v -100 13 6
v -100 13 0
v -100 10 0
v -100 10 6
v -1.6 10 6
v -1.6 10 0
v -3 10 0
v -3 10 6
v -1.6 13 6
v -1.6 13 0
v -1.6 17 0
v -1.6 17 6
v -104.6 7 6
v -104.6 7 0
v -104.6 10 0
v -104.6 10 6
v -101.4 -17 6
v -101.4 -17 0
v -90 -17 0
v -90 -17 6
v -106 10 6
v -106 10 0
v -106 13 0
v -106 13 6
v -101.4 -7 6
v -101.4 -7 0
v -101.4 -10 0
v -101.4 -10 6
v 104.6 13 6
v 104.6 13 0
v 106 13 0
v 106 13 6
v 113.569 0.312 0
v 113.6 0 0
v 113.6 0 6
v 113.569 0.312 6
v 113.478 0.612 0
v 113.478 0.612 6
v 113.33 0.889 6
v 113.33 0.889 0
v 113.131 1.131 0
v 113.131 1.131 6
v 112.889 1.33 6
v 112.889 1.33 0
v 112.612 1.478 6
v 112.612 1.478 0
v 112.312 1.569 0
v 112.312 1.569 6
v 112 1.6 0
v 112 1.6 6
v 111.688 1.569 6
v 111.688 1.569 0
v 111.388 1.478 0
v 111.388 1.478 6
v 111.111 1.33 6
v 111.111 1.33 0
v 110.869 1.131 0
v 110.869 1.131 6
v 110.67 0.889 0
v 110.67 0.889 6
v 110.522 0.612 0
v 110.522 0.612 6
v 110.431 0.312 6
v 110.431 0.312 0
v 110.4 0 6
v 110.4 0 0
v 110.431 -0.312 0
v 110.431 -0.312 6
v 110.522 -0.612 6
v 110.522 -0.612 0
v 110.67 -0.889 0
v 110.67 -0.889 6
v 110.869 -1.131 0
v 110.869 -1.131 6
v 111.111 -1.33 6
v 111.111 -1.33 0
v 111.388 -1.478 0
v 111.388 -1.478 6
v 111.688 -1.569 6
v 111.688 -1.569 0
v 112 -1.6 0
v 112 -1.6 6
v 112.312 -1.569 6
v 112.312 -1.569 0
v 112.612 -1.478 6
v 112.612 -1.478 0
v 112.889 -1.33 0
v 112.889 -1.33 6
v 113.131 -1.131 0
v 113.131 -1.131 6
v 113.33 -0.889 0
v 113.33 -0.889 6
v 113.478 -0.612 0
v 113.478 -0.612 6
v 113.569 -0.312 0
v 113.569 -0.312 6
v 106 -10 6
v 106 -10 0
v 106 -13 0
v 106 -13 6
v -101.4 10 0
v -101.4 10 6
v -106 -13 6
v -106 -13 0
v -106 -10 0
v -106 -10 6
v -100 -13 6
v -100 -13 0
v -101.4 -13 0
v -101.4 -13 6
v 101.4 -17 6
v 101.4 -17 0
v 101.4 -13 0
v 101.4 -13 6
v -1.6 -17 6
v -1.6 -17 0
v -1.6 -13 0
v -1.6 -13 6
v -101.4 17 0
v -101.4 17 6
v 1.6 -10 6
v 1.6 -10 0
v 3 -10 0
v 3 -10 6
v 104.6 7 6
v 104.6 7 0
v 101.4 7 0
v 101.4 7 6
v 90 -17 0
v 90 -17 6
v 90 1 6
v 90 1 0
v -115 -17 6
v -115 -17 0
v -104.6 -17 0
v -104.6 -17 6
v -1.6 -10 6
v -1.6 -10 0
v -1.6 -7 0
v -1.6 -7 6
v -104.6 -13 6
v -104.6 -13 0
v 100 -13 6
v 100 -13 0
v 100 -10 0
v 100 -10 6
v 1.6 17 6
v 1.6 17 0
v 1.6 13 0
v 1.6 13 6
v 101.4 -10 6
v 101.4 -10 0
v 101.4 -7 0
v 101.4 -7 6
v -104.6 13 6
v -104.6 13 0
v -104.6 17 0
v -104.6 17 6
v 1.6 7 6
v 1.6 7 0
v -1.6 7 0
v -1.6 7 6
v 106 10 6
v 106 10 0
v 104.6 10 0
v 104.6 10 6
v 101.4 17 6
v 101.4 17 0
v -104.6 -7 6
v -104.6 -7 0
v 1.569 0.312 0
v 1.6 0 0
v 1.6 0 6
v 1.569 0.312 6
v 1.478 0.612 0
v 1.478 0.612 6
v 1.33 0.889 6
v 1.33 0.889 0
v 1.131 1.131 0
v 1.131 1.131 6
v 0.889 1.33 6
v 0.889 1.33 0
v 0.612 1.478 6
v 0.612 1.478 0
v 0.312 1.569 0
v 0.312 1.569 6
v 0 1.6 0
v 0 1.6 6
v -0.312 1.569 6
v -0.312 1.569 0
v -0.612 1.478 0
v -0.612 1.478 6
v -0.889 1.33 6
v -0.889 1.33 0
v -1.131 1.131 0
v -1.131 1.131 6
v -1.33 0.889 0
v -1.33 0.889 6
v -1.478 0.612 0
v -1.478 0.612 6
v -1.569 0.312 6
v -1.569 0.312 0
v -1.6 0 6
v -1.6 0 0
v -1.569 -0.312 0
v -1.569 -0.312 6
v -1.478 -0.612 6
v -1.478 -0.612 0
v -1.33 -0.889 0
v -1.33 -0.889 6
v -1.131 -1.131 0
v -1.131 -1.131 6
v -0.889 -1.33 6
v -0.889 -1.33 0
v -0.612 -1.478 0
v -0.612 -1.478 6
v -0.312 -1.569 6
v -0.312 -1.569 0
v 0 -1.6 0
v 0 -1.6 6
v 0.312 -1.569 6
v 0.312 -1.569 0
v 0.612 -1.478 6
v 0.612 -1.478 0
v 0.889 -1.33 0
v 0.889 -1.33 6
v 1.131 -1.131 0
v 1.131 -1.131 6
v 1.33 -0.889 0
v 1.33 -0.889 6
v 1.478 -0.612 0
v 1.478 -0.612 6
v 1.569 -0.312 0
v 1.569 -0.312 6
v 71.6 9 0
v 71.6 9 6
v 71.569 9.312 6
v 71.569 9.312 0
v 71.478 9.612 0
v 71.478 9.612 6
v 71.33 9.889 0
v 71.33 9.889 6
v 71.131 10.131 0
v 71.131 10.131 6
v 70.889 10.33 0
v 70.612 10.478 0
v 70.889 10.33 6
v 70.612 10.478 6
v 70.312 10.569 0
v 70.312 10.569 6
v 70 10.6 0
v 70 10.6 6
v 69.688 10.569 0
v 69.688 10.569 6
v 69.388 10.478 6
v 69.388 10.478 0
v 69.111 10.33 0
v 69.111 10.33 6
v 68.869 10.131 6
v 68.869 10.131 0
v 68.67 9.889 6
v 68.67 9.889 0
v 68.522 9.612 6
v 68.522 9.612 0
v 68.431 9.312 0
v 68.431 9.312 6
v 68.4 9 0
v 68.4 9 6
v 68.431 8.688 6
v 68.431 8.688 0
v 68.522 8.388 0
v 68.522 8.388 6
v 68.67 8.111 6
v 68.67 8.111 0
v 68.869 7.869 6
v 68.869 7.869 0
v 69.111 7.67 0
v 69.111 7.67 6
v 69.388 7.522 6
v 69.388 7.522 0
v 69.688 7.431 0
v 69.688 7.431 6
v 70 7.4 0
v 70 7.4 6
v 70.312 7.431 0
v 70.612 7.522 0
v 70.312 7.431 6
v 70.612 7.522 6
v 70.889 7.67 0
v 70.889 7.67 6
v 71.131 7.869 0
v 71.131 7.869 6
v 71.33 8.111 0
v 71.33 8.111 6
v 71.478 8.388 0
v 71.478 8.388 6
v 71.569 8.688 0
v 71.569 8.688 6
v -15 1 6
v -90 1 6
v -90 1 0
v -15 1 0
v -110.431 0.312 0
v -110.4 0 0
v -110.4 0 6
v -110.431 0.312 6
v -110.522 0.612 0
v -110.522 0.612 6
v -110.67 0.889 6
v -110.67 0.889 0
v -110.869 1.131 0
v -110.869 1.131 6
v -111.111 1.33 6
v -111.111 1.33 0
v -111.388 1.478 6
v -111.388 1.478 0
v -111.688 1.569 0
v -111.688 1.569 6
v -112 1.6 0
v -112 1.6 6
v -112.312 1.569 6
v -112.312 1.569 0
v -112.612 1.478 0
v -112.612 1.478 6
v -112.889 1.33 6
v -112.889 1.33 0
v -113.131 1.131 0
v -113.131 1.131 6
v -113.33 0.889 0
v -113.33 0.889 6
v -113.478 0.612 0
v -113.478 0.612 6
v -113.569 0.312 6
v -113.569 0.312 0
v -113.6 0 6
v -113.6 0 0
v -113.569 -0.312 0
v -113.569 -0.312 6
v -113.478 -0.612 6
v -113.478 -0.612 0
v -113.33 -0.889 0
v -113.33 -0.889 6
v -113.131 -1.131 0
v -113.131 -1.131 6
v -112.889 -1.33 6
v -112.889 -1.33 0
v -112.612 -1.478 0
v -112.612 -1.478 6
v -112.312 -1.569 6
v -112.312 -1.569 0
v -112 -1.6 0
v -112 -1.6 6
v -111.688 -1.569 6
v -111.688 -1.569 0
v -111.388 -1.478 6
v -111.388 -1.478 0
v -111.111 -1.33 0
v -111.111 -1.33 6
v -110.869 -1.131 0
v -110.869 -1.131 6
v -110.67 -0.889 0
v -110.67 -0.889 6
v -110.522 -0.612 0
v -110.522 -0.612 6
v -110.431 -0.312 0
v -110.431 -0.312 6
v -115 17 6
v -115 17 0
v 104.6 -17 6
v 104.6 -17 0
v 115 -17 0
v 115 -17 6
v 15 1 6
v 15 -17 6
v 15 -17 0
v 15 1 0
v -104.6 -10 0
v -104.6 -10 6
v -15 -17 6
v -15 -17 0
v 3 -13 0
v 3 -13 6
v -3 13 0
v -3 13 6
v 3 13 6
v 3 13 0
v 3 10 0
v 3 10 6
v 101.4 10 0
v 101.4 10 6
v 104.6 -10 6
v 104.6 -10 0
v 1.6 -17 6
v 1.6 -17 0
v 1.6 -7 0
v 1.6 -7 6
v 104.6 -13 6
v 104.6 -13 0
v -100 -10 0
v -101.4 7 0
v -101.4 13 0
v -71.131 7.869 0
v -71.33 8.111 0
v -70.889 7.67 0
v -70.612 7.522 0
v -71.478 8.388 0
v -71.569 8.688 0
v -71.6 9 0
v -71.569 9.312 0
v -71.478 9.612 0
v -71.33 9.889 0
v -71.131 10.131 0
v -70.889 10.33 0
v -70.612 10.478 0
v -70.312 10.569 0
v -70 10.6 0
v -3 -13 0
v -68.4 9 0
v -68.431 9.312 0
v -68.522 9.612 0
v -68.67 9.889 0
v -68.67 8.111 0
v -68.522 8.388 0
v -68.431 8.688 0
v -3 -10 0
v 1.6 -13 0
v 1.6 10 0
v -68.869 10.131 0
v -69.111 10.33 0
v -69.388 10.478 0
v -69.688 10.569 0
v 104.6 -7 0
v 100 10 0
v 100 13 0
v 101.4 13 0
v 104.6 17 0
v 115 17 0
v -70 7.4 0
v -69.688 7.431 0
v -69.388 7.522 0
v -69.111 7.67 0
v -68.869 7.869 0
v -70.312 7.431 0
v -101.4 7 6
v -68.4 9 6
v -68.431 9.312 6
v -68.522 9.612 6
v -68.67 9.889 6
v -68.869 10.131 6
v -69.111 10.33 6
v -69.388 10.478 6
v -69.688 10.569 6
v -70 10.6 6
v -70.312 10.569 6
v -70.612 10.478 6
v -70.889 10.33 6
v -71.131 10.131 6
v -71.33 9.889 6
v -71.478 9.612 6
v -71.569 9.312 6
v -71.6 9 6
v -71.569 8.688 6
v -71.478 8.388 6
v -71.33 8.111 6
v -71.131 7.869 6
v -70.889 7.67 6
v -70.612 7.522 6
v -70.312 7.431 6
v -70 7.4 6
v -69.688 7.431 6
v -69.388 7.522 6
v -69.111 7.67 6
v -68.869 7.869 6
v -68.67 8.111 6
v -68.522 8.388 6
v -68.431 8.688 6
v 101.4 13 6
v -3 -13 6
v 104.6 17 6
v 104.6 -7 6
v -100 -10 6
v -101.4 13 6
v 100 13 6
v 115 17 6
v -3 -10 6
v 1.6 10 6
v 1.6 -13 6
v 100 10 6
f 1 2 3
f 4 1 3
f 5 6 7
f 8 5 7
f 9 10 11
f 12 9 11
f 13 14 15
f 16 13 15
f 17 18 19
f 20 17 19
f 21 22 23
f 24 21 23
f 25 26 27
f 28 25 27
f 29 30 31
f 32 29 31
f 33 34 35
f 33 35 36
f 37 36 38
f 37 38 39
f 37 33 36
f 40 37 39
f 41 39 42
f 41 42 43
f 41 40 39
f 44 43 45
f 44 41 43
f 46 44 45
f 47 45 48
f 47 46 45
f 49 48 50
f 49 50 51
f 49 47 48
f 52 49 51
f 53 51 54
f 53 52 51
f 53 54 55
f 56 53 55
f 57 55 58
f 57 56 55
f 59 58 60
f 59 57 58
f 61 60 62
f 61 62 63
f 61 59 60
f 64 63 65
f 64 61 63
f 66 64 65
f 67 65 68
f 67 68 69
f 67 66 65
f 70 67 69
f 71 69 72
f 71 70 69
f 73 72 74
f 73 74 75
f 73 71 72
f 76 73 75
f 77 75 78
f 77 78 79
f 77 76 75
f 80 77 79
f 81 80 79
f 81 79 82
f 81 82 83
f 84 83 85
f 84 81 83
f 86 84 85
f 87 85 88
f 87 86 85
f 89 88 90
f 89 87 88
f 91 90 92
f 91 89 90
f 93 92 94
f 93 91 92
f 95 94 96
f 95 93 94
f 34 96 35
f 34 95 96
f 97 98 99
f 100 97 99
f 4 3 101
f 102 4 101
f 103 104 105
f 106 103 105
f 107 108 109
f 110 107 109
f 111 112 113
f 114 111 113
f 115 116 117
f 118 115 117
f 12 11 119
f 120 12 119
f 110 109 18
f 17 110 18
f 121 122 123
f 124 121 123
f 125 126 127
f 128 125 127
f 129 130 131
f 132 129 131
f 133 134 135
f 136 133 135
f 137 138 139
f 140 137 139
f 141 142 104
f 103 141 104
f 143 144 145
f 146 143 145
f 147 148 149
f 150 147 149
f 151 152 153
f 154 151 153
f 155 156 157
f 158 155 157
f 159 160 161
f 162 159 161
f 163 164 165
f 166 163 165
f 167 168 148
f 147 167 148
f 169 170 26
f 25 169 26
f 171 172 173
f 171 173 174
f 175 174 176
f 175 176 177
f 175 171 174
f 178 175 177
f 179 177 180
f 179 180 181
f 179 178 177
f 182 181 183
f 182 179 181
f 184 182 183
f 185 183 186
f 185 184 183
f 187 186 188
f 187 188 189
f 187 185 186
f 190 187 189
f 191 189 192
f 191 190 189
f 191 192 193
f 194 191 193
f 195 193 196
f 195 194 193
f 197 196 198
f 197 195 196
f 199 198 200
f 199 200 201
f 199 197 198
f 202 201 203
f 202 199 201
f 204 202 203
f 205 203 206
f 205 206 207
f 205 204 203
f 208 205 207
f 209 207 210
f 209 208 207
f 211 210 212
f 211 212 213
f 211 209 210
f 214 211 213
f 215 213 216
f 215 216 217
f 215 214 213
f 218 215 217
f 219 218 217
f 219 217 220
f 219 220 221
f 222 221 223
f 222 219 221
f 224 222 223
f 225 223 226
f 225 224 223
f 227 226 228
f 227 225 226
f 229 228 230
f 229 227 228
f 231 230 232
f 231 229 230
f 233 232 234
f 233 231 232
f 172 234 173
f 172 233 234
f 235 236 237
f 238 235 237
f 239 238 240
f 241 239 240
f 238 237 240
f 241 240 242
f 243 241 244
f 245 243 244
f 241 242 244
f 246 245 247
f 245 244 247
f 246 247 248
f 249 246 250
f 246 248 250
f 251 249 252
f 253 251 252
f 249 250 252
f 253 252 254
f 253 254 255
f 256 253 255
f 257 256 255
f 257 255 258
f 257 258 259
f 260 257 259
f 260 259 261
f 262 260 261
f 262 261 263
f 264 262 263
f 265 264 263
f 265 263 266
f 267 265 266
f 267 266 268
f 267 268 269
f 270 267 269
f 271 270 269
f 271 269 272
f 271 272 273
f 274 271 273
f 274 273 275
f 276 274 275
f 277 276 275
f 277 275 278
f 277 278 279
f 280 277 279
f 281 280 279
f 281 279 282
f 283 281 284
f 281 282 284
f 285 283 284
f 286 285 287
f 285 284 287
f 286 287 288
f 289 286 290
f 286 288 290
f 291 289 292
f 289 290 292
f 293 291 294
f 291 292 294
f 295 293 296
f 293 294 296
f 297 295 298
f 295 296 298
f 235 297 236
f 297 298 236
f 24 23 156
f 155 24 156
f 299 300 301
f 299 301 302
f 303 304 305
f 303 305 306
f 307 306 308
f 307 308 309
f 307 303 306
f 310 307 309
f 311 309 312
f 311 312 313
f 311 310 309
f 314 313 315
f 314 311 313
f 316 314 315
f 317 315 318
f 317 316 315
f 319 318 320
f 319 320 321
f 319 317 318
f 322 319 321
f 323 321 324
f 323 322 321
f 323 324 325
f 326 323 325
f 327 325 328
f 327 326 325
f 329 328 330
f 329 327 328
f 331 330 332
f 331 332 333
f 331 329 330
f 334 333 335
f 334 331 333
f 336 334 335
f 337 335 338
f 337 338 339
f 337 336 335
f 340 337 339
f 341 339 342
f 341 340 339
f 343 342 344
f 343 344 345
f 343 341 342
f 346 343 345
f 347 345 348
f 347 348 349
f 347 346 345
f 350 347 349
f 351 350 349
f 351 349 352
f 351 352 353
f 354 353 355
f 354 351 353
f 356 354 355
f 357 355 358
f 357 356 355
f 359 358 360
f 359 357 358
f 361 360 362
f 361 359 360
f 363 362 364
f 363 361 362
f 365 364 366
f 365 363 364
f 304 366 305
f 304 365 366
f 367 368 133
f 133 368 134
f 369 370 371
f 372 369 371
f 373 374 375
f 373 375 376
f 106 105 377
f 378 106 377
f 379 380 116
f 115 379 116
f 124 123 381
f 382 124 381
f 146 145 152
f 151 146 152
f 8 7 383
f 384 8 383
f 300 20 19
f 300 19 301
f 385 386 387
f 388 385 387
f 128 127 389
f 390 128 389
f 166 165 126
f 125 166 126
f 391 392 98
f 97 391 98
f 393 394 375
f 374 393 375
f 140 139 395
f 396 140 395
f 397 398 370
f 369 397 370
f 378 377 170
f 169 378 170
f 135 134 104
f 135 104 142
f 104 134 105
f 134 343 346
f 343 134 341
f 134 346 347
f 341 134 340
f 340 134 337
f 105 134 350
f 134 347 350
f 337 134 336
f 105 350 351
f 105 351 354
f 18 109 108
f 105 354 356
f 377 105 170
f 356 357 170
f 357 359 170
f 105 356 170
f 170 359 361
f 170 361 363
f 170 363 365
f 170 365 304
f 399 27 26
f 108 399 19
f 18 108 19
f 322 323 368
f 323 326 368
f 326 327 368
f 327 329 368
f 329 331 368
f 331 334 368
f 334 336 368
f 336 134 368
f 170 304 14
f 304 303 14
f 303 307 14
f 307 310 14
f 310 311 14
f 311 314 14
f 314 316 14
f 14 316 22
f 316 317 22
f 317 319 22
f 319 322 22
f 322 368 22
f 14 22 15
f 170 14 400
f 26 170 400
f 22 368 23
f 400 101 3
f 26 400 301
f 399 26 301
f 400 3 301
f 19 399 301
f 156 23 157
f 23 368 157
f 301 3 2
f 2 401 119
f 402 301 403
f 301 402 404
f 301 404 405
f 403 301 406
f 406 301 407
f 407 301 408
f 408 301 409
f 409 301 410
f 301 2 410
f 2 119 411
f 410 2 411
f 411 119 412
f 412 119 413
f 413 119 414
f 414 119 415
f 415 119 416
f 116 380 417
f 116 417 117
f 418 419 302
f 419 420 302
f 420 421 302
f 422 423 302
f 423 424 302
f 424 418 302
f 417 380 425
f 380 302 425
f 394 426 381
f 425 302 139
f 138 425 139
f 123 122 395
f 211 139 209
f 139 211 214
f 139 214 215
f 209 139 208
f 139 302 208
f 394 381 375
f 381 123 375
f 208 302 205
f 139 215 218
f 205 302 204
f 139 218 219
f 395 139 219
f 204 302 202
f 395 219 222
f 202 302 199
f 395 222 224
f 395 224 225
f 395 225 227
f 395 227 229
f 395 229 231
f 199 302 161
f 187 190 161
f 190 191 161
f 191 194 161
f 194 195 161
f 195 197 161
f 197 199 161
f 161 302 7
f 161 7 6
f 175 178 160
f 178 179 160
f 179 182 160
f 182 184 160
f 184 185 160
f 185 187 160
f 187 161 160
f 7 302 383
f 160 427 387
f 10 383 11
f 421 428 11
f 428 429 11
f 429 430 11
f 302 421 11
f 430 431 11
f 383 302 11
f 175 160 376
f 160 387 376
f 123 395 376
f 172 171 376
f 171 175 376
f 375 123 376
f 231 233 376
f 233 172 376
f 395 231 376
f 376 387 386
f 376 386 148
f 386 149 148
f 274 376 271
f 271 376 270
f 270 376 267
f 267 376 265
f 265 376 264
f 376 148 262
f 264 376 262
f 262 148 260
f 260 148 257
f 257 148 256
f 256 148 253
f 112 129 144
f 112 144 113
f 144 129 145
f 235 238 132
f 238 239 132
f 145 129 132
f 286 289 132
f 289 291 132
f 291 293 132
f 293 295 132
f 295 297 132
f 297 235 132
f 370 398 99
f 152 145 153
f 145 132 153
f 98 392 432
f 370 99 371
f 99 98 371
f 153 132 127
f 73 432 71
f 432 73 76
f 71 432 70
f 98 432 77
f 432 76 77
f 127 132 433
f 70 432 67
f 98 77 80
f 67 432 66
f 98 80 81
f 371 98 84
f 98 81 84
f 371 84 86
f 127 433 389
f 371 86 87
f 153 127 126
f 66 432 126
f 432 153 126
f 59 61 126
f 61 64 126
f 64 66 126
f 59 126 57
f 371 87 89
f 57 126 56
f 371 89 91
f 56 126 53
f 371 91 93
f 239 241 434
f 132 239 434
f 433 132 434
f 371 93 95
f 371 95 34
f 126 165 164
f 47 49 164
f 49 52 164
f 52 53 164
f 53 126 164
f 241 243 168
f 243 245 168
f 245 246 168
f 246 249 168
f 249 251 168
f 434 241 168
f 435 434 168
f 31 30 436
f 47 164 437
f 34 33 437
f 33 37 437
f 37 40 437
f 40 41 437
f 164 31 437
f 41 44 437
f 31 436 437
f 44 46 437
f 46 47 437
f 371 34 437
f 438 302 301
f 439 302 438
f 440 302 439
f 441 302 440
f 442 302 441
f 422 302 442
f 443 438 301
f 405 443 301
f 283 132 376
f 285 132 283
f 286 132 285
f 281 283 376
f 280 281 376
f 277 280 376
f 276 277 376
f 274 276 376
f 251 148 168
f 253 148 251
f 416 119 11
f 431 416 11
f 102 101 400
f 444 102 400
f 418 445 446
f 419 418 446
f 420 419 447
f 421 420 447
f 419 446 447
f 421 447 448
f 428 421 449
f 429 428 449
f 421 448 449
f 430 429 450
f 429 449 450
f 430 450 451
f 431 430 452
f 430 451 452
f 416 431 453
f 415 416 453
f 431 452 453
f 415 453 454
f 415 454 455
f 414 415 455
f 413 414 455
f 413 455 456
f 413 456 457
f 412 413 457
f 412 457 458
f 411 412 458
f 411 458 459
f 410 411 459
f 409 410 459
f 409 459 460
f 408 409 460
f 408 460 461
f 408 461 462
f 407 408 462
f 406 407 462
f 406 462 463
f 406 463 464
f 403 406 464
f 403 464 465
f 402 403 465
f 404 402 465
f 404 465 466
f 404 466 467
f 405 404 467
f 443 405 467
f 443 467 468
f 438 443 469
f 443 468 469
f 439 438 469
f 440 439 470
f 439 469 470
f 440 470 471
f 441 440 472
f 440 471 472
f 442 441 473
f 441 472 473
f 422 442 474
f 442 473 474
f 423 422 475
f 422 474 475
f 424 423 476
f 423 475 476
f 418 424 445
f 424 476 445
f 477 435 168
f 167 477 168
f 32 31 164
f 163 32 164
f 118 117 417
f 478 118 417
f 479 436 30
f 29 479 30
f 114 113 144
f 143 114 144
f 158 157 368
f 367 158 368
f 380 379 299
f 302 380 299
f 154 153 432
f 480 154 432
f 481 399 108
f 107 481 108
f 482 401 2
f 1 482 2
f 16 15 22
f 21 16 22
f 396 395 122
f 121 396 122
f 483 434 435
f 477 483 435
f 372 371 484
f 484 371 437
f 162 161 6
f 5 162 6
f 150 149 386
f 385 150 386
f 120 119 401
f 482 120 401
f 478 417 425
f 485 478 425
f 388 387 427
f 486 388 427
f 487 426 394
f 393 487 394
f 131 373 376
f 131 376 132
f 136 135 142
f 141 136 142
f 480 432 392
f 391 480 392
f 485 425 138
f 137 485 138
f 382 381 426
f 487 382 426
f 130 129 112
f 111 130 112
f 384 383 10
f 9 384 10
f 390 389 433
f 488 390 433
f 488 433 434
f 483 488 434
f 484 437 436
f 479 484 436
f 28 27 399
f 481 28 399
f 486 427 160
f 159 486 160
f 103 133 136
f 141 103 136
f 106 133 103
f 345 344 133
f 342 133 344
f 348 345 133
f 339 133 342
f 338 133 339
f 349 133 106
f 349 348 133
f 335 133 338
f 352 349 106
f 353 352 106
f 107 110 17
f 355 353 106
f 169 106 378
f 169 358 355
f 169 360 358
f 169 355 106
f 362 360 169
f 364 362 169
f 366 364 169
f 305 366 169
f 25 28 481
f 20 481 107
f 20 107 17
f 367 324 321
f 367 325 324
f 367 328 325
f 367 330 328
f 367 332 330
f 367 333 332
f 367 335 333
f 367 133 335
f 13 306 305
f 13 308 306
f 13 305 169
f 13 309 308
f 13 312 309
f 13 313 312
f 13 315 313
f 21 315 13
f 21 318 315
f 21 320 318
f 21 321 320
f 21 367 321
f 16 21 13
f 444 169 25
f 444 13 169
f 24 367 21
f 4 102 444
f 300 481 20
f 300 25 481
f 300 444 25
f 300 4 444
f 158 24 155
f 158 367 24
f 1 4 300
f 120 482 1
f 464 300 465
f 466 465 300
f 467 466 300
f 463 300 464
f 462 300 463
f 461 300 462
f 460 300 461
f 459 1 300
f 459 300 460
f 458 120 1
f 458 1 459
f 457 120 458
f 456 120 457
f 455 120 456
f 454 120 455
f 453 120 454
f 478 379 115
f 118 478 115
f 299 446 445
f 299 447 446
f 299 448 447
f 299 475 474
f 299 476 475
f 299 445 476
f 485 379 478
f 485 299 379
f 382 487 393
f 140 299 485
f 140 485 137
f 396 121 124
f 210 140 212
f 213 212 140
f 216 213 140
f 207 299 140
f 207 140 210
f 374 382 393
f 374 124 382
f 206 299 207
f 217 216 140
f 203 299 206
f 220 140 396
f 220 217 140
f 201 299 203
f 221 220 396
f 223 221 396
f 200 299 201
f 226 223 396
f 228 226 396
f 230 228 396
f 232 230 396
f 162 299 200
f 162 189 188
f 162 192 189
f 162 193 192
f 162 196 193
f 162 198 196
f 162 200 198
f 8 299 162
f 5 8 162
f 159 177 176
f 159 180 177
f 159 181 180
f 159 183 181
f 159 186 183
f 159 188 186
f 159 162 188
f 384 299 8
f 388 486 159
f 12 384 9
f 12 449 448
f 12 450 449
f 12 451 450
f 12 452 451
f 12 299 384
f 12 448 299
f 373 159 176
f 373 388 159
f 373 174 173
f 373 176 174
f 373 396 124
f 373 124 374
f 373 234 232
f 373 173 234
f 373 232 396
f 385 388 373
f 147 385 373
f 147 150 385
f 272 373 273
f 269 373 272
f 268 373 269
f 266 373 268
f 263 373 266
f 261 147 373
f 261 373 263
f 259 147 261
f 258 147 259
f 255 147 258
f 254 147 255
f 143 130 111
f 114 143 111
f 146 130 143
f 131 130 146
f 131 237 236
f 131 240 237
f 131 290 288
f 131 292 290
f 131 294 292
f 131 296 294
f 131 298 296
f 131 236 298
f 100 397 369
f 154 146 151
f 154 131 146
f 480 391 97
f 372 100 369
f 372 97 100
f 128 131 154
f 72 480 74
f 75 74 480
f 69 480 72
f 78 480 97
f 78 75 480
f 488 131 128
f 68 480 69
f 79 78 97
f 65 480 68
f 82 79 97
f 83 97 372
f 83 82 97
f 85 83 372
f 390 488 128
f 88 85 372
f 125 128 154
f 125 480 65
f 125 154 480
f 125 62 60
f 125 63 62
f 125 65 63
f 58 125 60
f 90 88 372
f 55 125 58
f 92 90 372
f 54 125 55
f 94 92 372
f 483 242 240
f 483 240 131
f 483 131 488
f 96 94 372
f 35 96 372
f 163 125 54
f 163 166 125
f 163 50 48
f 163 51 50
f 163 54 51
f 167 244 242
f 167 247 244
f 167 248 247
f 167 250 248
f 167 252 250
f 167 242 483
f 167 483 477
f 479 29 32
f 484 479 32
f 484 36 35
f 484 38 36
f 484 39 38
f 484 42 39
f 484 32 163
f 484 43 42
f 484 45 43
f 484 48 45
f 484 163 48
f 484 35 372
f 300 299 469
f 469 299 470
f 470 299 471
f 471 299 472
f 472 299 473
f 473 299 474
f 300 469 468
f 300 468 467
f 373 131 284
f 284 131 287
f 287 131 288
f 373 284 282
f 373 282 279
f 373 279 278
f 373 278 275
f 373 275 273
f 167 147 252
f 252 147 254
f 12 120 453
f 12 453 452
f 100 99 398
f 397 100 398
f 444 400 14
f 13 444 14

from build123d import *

# Parameters (mm, degrees)
ESBO_O1_R                = 1.6
RESSALTO_EXTRUS_O1_DEPTH = 6
ESBO_O2_R                = 1.6
ESBO_O2_W                = 75
ESBO_O2_H                = 18
CORTE_EXTRUS_O1_DEPTH    = 10


with BuildPart() as part:
    # Esboço1 → Ressalto-extrusão1 (new body)
    with BuildSketch(Plane.XY):
        Polygon((-115, 17), (-115, -17), (-104.6, -17), (-104.6, -13), (-106, -13), (-106, -10), (-104.6, -10), (-104.6, -7), (-101.4, -7), (-101.4, -10), (-100, -10), (-100, -13), (-101.4, -13), (-101.4, -17), (-1.6, -17), (-1.6, -13), (-3, -13), (-3, -10), (-1.6, -10), (-1.6, -7), (1.6, -7), (1.6, -10), (3, -10), (3, -13), (1.6, -13), (1.6, -17), (101.4, -17), (101.4, -13), (100, -13), (100, -10), (101.4, -10), (101.4, -7), (104.6, -7), (104.6, -10), (106, -10), (106, -13), (104.6, -13), (104.6, -17), (115, -17), (115, 17), (104.6, 17), (104.6, 13), (106, 13), (106, 10), (104.6, 10), (104.6, 7), (101.4, 7), (101.4, 10), (100, 10), (100, 13), (101.4, 13), (101.4, 17), (1.6, 17), (1.6, 13), (3, 13), (3, 10), (1.6, 10), (1.6, 7), (-1.6, 7), (-1.6, 10), (-3, 10), (-3, 13), (-1.6, 13), (-1.6, 17), (-101.4, 17), (-101.4, 13), (-100, 13), (-100, 10), (-101.4, 10), (-101.4, 7), (-104.6, 7), (-104.6, 10), (-106, 10), (-106, 13), (-104.6, 13), (-104.6, 17), align=None)
        with Locations((112, 0)):
            Circle(ESBO_O1_R, mode=Mode.SUBTRACT)
        Circle(ESBO_O1_R, mode=Mode.SUBTRACT)
        with Locations((-112, 0)):
            Circle(ESBO_O1_R, mode=Mode.SUBTRACT)
    extrude(amount=RESSALTO_EXTRUS_O1_DEPTH)

    # Esboço2 → Corte-extrusão1 (cut)
    with BuildSketch(Plane.XY.offset(6)):
        with Locations((70, 9)):
            Circle(ESBO_O2_R)
        with Locations((-70, 9)):
            Circle(ESBO_O2_R)
        with Locations((52.5, -8)):
            Rectangle(ESBO_O2_W, ESBO_O2_H)
        with Locations((-52.5, -8)):
            Rectangle(ESBO_O2_W, ESBO_O2_H)
    extrude(amount=-CORTE_EXTRUS_O1_DEPTH, mode=Mode.SUBTRACT)


solid = part.part
